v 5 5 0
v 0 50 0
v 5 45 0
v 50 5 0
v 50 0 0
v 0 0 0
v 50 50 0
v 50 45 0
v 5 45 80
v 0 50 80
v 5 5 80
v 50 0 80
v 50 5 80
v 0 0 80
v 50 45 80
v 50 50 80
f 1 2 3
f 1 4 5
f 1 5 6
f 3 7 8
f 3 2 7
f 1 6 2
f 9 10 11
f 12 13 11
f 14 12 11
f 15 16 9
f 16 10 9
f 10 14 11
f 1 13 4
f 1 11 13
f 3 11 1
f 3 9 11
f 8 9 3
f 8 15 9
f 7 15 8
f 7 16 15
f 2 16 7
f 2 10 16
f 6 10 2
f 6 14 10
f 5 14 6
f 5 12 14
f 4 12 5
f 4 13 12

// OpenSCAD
$fn = 32;

// ----------------------------------------------------------------------
// Structural section: channel 50 x 50 mm
// ----------------------------------------------------------------------

// --- parameters (mm) ---
sec_w = 50;               // channel width, X
sec_h = 50;               // channel height, Y
flange_t = 5;             // flange thickness
web_t = 5;                // web thickness
plate_t = 80;             // cut length, Z (extrusion height)
fit_tol = 0.1;            // declared fit tolerance (prompt contract)
free_tol = 0.5;           // declared free tolerance (prompt contract)

profile = [[0, 0], [50, 0], [50, 5], [5, 5], [5, 45], [50, 45], [50, 50], [0, 50]];  // primary outline, 8 points, counter clockwise

// --- the one profile operation ---
linear_extrude(height = plate_t) polygon(points = profile);
